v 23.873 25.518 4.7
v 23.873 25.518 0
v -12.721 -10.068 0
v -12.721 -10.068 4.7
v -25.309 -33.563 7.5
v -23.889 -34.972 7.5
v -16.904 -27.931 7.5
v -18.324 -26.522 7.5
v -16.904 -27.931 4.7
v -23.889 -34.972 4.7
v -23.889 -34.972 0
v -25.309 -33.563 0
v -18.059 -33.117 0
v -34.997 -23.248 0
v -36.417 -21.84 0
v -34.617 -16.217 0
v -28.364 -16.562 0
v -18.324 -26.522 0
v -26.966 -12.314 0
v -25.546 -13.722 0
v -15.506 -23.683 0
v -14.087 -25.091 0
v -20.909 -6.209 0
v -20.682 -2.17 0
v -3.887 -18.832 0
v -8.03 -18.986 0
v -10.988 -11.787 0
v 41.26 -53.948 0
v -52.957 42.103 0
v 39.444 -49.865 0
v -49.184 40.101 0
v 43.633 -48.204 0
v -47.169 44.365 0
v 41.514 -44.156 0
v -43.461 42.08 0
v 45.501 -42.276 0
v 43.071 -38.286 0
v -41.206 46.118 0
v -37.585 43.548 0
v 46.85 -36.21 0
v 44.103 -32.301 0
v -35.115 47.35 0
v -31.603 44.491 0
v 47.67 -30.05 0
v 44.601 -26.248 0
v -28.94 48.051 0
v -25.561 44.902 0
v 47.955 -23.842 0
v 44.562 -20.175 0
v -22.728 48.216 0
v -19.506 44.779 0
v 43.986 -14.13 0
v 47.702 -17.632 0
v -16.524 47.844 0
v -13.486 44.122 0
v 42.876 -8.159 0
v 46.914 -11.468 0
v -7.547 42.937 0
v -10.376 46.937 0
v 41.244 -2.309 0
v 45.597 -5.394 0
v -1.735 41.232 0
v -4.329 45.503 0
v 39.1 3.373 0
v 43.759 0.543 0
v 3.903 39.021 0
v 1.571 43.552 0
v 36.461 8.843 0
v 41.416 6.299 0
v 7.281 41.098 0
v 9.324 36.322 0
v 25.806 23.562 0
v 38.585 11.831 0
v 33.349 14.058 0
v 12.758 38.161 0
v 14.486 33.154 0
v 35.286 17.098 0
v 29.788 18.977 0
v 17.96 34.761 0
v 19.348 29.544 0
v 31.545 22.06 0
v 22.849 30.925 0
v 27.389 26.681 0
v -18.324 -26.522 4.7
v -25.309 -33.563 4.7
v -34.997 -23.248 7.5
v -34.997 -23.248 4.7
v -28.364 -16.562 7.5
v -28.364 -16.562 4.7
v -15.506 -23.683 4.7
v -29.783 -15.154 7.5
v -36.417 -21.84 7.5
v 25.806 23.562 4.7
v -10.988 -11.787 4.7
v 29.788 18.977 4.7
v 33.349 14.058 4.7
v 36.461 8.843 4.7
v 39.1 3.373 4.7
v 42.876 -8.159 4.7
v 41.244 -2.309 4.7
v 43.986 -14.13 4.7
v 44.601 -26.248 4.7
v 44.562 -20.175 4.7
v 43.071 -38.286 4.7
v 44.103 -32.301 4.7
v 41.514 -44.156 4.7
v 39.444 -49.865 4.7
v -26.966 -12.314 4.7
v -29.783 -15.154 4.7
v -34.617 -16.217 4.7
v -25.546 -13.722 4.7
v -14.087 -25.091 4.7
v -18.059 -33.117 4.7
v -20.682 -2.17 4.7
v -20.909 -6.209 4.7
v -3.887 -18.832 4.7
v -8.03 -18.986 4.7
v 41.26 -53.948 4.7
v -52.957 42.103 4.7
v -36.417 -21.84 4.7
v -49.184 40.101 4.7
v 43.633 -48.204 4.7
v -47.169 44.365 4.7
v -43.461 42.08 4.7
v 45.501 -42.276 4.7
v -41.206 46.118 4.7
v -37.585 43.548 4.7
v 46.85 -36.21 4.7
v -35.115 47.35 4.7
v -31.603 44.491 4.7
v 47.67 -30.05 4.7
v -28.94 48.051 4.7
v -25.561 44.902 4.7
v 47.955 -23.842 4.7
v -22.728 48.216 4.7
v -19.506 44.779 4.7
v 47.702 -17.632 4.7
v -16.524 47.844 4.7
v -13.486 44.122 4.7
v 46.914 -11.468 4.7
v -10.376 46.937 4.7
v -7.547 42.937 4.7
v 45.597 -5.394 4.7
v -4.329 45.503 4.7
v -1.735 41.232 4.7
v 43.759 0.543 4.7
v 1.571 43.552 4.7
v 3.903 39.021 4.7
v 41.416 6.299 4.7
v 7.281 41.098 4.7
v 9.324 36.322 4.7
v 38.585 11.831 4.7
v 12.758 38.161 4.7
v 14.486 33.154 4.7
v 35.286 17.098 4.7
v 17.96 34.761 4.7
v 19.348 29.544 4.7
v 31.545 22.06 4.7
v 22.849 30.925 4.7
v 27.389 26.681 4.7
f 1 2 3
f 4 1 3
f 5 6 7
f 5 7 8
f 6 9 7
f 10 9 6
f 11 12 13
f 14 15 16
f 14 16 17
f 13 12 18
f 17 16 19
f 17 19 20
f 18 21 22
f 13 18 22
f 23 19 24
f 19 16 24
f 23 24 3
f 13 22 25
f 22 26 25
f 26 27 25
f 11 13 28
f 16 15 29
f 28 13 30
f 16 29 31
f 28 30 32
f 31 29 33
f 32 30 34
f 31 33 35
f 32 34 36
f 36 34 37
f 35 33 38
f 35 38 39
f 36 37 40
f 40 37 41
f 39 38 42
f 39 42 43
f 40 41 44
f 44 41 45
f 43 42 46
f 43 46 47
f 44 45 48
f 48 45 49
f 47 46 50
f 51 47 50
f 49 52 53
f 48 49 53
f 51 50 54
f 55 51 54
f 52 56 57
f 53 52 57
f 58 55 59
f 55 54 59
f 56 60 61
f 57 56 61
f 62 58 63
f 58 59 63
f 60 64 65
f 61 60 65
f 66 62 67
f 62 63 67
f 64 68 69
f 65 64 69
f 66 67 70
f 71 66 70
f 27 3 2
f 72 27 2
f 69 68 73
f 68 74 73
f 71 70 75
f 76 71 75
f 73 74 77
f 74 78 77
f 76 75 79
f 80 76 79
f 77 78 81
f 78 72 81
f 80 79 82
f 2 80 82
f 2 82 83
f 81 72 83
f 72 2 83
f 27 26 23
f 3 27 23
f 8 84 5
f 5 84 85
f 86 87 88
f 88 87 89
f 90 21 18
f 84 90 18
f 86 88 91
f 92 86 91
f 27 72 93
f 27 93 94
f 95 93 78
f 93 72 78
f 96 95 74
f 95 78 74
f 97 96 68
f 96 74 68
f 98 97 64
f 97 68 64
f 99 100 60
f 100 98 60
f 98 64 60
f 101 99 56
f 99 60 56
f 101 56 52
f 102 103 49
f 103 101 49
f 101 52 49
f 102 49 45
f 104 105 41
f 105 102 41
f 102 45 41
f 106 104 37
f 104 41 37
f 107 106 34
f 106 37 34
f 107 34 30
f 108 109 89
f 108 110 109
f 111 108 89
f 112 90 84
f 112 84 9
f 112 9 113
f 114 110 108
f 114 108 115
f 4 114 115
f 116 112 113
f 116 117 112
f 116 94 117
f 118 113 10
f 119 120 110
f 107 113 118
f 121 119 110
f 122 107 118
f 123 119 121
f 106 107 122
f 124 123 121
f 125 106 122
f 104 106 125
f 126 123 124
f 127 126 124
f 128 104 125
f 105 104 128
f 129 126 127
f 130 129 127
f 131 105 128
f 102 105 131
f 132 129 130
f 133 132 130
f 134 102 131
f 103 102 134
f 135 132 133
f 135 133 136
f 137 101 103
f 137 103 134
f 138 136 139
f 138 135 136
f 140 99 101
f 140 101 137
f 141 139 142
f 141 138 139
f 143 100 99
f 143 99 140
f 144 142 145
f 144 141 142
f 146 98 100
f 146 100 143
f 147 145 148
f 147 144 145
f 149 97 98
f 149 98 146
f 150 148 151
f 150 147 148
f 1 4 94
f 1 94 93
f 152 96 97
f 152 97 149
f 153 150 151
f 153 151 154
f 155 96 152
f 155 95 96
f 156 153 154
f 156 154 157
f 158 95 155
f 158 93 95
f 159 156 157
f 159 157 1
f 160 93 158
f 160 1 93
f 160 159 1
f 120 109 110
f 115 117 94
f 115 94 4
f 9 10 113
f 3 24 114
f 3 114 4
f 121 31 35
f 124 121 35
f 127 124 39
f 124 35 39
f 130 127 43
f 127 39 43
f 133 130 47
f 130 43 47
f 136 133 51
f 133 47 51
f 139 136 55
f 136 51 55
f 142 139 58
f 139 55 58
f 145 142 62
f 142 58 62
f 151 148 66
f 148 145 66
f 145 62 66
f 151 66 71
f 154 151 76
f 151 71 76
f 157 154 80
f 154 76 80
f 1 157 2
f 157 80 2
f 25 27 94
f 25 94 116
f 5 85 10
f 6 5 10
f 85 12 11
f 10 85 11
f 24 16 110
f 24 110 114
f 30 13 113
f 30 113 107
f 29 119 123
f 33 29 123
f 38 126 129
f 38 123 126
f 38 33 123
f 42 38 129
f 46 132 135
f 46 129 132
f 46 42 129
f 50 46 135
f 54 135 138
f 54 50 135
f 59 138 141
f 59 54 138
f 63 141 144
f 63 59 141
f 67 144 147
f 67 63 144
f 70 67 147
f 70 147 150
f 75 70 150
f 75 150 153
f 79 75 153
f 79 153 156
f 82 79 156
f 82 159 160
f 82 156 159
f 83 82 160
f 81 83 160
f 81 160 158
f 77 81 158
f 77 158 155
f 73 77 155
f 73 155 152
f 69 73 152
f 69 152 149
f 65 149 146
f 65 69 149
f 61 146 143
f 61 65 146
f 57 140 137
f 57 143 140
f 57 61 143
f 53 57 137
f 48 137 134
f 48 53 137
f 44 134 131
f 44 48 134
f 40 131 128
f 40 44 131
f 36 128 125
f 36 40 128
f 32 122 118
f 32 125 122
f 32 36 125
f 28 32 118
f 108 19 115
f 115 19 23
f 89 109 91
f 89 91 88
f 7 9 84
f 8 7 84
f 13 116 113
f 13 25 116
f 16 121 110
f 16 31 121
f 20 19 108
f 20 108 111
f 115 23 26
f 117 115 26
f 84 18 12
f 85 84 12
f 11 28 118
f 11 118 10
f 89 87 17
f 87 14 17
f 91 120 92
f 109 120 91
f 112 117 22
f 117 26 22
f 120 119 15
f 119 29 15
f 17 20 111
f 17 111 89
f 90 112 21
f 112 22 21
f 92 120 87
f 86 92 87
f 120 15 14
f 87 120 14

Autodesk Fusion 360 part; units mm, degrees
sketch "Sketch1" plane through (0, 0, 0) normal (0, 0, 1) x (1, 0, 0)
  line L0 (41.26, -53.9475) -> (-23.8891, -34.972)
  arc A0 (41.26, -53.9475) -> (-52.9571, 42.103) centre (-23.9263, -23.6549) ccw
  line L1 (-49.1844, 40.1007) -> (-34.6167, -16.2167)
  line L2 (-34.6167, -16.2167) -> (-20.6815, -2.1702)
  line L3 (-3.8871, -18.8317) -> (-18.0593, -33.1169)
  line L4 (-18.0593, -33.1169) -> (39.4437, -49.8653)
  arc A1 (23.8726, 25.5184) -> (-49.1844, 40.1007) centre (-23.9263, -23.6549) ccw
  line L5 (23.8726, 25.5184) -> (-12.7212, -10.0675)
  line L6 (25.8056, 23.5625) -> (-10.9878, -11.7872)
  arc A2 (39.4437, -49.8653) -> (25.8056, 23.5625) centre (-23.9263, -23.6549) ccw
  line L7 (23.8726, 25.5184) -> (28.5034, 25.5184) construction
  line L8 (-20.6815, -2.1702) -> (-12.7212, -10.0675)
  line L9 (-10.9878, -11.7872) -> (-3.8871, -18.8317)
  line L10 (-36.4169, -21.8399) -> (-29.7834, -15.1535)
  line L11 (-20.9093, -6.2086) -> (-8.0298, -18.9862)
  line L12 (-16.9038, -27.9311) -> (-23.8891, -34.972)
  line L13 (-52.9571, 42.103) -> (-36.4169, -21.8399)
  line L14 (-8.0298, -18.9862) -> (-14.0867, -25.0914)
  line L15 (-14.0867, -25.0914) -> (-15.5065, -23.6828)
  line L16 (-15.5065, -23.6828) -> (-18.3237, -26.5225)
  line L17 (-18.3237, -26.5225) -> (-16.9038, -27.9311)
  line L18 (-26.9662, -12.3138) -> (-20.9093, -6.2086)
  line L19 (-26.9662, -12.3138) -> (-25.5464, -13.7224)
  line L20 (-25.5464, -13.7224) -> (-28.3636, -16.562)
  line L21 (-28.3636, -16.562) -> (-29.7834, -15.1535)
  line L22 (-18.3237, -26.5225) -> (-25.3088, -33.5634)
  line L23 (-25.3088, -33.5634) -> (-23.8891, -34.972)
  line L24 (-36.4169, -21.8399) -> (-34.9971, -23.2485)
  line L25 (-34.9971, -23.2485) -> (-28.3636, -16.562)
  dimension "d4" = 2
  dimension "d5" = 4
  dimension "d6" = 2
  dimension "d7" = 4
  dimension "d8" = 9.918
  dimension "d9" = 2
extrude "Extrude1" add sketch "Sketch1" along normal blind 4.7
sketch "Sketch2" plane through (0, 0, 4.7) normal (0, 0, 1) x (-1, 0, 0)
  arc A0 (-23.8726, -25.5184) -> (49.1844, -40.1007) centre (23.9263, 23.6549) ccw
  line L0 (-23.8726, -25.5184) -> (12.7212, 10.0675)
  line L1 (12.7212, 10.0675) -> (20.6815, 2.1702)
  line L2 (20.6815, 2.1702) -> (34.6167, 16.2167)
  line L3 (34.6167, 16.2167) -> (49.1844, -40.1007)
  line L4 (3.8871, 18.8317) -> (10.9878, 11.7872)
  line L5 (10.9878, 11.7872) -> (-25.8056, -23.5625)
  arc A1 (-39.4437, 49.8653) -> (-25.8056, -23.5625) centre (23.9263, 23.6549) ccw
  line L6 (-39.4437, 49.8653) -> (18.0593, 33.1169)
  line L7 (18.0593, 33.1169) -> (3.8871, 18.8317)
  arc A2 (-41.26, 53.9475) -> (52.9571, -42.103) centre (23.9263, 23.6549) ccw
  line L8 (52.9571, -42.103) -> (36.4169, 21.8399)
  line L9 (36.4169, 21.8399) -> (34.9971, 23.2485)
  line L10 (34.9971, 23.2485) -> (25.5464, 13.7224)
  line L11 (25.5464, 13.7224) -> (26.9662, 12.3138)
  line L12 (26.9662, 12.3138) -> (20.9093, 6.2086)
  line L13 (20.9093, 6.2086) -> (8.0298, 18.9862)
  line L14 (8.0298, 18.9862) -> (14.0867, 25.0914)
  line L15 (14.0867, 25.0914) -> (15.5065, 23.6828)
  line L16 (15.5065, 23.6828) -> (25.3088, 33.5634)
  line L17 (25.3088, 33.5634) -> (23.8891, 34.972)
  line L18 (23.8891, 34.972) -> (-41.26, 53.9475)
  line L19 (16.9038, 27.9311) -> (18.3237, 26.5225)
  line L20 (16.9038, 27.9311) -> (23.8891, 34.972)
  line L21 (36.4169, 21.8399) -> (29.7834, 15.1535)
  line L22 (29.7834, 15.1535) -> (28.3636, 16.562)
  dimension "d12" = 4
  dimension "d13" = 4
extrude "Extrude2" add sketch "Sketch2" along normal blind 2.8 contours L16 L17 L19 L20 | L9 L10 L21 L22
